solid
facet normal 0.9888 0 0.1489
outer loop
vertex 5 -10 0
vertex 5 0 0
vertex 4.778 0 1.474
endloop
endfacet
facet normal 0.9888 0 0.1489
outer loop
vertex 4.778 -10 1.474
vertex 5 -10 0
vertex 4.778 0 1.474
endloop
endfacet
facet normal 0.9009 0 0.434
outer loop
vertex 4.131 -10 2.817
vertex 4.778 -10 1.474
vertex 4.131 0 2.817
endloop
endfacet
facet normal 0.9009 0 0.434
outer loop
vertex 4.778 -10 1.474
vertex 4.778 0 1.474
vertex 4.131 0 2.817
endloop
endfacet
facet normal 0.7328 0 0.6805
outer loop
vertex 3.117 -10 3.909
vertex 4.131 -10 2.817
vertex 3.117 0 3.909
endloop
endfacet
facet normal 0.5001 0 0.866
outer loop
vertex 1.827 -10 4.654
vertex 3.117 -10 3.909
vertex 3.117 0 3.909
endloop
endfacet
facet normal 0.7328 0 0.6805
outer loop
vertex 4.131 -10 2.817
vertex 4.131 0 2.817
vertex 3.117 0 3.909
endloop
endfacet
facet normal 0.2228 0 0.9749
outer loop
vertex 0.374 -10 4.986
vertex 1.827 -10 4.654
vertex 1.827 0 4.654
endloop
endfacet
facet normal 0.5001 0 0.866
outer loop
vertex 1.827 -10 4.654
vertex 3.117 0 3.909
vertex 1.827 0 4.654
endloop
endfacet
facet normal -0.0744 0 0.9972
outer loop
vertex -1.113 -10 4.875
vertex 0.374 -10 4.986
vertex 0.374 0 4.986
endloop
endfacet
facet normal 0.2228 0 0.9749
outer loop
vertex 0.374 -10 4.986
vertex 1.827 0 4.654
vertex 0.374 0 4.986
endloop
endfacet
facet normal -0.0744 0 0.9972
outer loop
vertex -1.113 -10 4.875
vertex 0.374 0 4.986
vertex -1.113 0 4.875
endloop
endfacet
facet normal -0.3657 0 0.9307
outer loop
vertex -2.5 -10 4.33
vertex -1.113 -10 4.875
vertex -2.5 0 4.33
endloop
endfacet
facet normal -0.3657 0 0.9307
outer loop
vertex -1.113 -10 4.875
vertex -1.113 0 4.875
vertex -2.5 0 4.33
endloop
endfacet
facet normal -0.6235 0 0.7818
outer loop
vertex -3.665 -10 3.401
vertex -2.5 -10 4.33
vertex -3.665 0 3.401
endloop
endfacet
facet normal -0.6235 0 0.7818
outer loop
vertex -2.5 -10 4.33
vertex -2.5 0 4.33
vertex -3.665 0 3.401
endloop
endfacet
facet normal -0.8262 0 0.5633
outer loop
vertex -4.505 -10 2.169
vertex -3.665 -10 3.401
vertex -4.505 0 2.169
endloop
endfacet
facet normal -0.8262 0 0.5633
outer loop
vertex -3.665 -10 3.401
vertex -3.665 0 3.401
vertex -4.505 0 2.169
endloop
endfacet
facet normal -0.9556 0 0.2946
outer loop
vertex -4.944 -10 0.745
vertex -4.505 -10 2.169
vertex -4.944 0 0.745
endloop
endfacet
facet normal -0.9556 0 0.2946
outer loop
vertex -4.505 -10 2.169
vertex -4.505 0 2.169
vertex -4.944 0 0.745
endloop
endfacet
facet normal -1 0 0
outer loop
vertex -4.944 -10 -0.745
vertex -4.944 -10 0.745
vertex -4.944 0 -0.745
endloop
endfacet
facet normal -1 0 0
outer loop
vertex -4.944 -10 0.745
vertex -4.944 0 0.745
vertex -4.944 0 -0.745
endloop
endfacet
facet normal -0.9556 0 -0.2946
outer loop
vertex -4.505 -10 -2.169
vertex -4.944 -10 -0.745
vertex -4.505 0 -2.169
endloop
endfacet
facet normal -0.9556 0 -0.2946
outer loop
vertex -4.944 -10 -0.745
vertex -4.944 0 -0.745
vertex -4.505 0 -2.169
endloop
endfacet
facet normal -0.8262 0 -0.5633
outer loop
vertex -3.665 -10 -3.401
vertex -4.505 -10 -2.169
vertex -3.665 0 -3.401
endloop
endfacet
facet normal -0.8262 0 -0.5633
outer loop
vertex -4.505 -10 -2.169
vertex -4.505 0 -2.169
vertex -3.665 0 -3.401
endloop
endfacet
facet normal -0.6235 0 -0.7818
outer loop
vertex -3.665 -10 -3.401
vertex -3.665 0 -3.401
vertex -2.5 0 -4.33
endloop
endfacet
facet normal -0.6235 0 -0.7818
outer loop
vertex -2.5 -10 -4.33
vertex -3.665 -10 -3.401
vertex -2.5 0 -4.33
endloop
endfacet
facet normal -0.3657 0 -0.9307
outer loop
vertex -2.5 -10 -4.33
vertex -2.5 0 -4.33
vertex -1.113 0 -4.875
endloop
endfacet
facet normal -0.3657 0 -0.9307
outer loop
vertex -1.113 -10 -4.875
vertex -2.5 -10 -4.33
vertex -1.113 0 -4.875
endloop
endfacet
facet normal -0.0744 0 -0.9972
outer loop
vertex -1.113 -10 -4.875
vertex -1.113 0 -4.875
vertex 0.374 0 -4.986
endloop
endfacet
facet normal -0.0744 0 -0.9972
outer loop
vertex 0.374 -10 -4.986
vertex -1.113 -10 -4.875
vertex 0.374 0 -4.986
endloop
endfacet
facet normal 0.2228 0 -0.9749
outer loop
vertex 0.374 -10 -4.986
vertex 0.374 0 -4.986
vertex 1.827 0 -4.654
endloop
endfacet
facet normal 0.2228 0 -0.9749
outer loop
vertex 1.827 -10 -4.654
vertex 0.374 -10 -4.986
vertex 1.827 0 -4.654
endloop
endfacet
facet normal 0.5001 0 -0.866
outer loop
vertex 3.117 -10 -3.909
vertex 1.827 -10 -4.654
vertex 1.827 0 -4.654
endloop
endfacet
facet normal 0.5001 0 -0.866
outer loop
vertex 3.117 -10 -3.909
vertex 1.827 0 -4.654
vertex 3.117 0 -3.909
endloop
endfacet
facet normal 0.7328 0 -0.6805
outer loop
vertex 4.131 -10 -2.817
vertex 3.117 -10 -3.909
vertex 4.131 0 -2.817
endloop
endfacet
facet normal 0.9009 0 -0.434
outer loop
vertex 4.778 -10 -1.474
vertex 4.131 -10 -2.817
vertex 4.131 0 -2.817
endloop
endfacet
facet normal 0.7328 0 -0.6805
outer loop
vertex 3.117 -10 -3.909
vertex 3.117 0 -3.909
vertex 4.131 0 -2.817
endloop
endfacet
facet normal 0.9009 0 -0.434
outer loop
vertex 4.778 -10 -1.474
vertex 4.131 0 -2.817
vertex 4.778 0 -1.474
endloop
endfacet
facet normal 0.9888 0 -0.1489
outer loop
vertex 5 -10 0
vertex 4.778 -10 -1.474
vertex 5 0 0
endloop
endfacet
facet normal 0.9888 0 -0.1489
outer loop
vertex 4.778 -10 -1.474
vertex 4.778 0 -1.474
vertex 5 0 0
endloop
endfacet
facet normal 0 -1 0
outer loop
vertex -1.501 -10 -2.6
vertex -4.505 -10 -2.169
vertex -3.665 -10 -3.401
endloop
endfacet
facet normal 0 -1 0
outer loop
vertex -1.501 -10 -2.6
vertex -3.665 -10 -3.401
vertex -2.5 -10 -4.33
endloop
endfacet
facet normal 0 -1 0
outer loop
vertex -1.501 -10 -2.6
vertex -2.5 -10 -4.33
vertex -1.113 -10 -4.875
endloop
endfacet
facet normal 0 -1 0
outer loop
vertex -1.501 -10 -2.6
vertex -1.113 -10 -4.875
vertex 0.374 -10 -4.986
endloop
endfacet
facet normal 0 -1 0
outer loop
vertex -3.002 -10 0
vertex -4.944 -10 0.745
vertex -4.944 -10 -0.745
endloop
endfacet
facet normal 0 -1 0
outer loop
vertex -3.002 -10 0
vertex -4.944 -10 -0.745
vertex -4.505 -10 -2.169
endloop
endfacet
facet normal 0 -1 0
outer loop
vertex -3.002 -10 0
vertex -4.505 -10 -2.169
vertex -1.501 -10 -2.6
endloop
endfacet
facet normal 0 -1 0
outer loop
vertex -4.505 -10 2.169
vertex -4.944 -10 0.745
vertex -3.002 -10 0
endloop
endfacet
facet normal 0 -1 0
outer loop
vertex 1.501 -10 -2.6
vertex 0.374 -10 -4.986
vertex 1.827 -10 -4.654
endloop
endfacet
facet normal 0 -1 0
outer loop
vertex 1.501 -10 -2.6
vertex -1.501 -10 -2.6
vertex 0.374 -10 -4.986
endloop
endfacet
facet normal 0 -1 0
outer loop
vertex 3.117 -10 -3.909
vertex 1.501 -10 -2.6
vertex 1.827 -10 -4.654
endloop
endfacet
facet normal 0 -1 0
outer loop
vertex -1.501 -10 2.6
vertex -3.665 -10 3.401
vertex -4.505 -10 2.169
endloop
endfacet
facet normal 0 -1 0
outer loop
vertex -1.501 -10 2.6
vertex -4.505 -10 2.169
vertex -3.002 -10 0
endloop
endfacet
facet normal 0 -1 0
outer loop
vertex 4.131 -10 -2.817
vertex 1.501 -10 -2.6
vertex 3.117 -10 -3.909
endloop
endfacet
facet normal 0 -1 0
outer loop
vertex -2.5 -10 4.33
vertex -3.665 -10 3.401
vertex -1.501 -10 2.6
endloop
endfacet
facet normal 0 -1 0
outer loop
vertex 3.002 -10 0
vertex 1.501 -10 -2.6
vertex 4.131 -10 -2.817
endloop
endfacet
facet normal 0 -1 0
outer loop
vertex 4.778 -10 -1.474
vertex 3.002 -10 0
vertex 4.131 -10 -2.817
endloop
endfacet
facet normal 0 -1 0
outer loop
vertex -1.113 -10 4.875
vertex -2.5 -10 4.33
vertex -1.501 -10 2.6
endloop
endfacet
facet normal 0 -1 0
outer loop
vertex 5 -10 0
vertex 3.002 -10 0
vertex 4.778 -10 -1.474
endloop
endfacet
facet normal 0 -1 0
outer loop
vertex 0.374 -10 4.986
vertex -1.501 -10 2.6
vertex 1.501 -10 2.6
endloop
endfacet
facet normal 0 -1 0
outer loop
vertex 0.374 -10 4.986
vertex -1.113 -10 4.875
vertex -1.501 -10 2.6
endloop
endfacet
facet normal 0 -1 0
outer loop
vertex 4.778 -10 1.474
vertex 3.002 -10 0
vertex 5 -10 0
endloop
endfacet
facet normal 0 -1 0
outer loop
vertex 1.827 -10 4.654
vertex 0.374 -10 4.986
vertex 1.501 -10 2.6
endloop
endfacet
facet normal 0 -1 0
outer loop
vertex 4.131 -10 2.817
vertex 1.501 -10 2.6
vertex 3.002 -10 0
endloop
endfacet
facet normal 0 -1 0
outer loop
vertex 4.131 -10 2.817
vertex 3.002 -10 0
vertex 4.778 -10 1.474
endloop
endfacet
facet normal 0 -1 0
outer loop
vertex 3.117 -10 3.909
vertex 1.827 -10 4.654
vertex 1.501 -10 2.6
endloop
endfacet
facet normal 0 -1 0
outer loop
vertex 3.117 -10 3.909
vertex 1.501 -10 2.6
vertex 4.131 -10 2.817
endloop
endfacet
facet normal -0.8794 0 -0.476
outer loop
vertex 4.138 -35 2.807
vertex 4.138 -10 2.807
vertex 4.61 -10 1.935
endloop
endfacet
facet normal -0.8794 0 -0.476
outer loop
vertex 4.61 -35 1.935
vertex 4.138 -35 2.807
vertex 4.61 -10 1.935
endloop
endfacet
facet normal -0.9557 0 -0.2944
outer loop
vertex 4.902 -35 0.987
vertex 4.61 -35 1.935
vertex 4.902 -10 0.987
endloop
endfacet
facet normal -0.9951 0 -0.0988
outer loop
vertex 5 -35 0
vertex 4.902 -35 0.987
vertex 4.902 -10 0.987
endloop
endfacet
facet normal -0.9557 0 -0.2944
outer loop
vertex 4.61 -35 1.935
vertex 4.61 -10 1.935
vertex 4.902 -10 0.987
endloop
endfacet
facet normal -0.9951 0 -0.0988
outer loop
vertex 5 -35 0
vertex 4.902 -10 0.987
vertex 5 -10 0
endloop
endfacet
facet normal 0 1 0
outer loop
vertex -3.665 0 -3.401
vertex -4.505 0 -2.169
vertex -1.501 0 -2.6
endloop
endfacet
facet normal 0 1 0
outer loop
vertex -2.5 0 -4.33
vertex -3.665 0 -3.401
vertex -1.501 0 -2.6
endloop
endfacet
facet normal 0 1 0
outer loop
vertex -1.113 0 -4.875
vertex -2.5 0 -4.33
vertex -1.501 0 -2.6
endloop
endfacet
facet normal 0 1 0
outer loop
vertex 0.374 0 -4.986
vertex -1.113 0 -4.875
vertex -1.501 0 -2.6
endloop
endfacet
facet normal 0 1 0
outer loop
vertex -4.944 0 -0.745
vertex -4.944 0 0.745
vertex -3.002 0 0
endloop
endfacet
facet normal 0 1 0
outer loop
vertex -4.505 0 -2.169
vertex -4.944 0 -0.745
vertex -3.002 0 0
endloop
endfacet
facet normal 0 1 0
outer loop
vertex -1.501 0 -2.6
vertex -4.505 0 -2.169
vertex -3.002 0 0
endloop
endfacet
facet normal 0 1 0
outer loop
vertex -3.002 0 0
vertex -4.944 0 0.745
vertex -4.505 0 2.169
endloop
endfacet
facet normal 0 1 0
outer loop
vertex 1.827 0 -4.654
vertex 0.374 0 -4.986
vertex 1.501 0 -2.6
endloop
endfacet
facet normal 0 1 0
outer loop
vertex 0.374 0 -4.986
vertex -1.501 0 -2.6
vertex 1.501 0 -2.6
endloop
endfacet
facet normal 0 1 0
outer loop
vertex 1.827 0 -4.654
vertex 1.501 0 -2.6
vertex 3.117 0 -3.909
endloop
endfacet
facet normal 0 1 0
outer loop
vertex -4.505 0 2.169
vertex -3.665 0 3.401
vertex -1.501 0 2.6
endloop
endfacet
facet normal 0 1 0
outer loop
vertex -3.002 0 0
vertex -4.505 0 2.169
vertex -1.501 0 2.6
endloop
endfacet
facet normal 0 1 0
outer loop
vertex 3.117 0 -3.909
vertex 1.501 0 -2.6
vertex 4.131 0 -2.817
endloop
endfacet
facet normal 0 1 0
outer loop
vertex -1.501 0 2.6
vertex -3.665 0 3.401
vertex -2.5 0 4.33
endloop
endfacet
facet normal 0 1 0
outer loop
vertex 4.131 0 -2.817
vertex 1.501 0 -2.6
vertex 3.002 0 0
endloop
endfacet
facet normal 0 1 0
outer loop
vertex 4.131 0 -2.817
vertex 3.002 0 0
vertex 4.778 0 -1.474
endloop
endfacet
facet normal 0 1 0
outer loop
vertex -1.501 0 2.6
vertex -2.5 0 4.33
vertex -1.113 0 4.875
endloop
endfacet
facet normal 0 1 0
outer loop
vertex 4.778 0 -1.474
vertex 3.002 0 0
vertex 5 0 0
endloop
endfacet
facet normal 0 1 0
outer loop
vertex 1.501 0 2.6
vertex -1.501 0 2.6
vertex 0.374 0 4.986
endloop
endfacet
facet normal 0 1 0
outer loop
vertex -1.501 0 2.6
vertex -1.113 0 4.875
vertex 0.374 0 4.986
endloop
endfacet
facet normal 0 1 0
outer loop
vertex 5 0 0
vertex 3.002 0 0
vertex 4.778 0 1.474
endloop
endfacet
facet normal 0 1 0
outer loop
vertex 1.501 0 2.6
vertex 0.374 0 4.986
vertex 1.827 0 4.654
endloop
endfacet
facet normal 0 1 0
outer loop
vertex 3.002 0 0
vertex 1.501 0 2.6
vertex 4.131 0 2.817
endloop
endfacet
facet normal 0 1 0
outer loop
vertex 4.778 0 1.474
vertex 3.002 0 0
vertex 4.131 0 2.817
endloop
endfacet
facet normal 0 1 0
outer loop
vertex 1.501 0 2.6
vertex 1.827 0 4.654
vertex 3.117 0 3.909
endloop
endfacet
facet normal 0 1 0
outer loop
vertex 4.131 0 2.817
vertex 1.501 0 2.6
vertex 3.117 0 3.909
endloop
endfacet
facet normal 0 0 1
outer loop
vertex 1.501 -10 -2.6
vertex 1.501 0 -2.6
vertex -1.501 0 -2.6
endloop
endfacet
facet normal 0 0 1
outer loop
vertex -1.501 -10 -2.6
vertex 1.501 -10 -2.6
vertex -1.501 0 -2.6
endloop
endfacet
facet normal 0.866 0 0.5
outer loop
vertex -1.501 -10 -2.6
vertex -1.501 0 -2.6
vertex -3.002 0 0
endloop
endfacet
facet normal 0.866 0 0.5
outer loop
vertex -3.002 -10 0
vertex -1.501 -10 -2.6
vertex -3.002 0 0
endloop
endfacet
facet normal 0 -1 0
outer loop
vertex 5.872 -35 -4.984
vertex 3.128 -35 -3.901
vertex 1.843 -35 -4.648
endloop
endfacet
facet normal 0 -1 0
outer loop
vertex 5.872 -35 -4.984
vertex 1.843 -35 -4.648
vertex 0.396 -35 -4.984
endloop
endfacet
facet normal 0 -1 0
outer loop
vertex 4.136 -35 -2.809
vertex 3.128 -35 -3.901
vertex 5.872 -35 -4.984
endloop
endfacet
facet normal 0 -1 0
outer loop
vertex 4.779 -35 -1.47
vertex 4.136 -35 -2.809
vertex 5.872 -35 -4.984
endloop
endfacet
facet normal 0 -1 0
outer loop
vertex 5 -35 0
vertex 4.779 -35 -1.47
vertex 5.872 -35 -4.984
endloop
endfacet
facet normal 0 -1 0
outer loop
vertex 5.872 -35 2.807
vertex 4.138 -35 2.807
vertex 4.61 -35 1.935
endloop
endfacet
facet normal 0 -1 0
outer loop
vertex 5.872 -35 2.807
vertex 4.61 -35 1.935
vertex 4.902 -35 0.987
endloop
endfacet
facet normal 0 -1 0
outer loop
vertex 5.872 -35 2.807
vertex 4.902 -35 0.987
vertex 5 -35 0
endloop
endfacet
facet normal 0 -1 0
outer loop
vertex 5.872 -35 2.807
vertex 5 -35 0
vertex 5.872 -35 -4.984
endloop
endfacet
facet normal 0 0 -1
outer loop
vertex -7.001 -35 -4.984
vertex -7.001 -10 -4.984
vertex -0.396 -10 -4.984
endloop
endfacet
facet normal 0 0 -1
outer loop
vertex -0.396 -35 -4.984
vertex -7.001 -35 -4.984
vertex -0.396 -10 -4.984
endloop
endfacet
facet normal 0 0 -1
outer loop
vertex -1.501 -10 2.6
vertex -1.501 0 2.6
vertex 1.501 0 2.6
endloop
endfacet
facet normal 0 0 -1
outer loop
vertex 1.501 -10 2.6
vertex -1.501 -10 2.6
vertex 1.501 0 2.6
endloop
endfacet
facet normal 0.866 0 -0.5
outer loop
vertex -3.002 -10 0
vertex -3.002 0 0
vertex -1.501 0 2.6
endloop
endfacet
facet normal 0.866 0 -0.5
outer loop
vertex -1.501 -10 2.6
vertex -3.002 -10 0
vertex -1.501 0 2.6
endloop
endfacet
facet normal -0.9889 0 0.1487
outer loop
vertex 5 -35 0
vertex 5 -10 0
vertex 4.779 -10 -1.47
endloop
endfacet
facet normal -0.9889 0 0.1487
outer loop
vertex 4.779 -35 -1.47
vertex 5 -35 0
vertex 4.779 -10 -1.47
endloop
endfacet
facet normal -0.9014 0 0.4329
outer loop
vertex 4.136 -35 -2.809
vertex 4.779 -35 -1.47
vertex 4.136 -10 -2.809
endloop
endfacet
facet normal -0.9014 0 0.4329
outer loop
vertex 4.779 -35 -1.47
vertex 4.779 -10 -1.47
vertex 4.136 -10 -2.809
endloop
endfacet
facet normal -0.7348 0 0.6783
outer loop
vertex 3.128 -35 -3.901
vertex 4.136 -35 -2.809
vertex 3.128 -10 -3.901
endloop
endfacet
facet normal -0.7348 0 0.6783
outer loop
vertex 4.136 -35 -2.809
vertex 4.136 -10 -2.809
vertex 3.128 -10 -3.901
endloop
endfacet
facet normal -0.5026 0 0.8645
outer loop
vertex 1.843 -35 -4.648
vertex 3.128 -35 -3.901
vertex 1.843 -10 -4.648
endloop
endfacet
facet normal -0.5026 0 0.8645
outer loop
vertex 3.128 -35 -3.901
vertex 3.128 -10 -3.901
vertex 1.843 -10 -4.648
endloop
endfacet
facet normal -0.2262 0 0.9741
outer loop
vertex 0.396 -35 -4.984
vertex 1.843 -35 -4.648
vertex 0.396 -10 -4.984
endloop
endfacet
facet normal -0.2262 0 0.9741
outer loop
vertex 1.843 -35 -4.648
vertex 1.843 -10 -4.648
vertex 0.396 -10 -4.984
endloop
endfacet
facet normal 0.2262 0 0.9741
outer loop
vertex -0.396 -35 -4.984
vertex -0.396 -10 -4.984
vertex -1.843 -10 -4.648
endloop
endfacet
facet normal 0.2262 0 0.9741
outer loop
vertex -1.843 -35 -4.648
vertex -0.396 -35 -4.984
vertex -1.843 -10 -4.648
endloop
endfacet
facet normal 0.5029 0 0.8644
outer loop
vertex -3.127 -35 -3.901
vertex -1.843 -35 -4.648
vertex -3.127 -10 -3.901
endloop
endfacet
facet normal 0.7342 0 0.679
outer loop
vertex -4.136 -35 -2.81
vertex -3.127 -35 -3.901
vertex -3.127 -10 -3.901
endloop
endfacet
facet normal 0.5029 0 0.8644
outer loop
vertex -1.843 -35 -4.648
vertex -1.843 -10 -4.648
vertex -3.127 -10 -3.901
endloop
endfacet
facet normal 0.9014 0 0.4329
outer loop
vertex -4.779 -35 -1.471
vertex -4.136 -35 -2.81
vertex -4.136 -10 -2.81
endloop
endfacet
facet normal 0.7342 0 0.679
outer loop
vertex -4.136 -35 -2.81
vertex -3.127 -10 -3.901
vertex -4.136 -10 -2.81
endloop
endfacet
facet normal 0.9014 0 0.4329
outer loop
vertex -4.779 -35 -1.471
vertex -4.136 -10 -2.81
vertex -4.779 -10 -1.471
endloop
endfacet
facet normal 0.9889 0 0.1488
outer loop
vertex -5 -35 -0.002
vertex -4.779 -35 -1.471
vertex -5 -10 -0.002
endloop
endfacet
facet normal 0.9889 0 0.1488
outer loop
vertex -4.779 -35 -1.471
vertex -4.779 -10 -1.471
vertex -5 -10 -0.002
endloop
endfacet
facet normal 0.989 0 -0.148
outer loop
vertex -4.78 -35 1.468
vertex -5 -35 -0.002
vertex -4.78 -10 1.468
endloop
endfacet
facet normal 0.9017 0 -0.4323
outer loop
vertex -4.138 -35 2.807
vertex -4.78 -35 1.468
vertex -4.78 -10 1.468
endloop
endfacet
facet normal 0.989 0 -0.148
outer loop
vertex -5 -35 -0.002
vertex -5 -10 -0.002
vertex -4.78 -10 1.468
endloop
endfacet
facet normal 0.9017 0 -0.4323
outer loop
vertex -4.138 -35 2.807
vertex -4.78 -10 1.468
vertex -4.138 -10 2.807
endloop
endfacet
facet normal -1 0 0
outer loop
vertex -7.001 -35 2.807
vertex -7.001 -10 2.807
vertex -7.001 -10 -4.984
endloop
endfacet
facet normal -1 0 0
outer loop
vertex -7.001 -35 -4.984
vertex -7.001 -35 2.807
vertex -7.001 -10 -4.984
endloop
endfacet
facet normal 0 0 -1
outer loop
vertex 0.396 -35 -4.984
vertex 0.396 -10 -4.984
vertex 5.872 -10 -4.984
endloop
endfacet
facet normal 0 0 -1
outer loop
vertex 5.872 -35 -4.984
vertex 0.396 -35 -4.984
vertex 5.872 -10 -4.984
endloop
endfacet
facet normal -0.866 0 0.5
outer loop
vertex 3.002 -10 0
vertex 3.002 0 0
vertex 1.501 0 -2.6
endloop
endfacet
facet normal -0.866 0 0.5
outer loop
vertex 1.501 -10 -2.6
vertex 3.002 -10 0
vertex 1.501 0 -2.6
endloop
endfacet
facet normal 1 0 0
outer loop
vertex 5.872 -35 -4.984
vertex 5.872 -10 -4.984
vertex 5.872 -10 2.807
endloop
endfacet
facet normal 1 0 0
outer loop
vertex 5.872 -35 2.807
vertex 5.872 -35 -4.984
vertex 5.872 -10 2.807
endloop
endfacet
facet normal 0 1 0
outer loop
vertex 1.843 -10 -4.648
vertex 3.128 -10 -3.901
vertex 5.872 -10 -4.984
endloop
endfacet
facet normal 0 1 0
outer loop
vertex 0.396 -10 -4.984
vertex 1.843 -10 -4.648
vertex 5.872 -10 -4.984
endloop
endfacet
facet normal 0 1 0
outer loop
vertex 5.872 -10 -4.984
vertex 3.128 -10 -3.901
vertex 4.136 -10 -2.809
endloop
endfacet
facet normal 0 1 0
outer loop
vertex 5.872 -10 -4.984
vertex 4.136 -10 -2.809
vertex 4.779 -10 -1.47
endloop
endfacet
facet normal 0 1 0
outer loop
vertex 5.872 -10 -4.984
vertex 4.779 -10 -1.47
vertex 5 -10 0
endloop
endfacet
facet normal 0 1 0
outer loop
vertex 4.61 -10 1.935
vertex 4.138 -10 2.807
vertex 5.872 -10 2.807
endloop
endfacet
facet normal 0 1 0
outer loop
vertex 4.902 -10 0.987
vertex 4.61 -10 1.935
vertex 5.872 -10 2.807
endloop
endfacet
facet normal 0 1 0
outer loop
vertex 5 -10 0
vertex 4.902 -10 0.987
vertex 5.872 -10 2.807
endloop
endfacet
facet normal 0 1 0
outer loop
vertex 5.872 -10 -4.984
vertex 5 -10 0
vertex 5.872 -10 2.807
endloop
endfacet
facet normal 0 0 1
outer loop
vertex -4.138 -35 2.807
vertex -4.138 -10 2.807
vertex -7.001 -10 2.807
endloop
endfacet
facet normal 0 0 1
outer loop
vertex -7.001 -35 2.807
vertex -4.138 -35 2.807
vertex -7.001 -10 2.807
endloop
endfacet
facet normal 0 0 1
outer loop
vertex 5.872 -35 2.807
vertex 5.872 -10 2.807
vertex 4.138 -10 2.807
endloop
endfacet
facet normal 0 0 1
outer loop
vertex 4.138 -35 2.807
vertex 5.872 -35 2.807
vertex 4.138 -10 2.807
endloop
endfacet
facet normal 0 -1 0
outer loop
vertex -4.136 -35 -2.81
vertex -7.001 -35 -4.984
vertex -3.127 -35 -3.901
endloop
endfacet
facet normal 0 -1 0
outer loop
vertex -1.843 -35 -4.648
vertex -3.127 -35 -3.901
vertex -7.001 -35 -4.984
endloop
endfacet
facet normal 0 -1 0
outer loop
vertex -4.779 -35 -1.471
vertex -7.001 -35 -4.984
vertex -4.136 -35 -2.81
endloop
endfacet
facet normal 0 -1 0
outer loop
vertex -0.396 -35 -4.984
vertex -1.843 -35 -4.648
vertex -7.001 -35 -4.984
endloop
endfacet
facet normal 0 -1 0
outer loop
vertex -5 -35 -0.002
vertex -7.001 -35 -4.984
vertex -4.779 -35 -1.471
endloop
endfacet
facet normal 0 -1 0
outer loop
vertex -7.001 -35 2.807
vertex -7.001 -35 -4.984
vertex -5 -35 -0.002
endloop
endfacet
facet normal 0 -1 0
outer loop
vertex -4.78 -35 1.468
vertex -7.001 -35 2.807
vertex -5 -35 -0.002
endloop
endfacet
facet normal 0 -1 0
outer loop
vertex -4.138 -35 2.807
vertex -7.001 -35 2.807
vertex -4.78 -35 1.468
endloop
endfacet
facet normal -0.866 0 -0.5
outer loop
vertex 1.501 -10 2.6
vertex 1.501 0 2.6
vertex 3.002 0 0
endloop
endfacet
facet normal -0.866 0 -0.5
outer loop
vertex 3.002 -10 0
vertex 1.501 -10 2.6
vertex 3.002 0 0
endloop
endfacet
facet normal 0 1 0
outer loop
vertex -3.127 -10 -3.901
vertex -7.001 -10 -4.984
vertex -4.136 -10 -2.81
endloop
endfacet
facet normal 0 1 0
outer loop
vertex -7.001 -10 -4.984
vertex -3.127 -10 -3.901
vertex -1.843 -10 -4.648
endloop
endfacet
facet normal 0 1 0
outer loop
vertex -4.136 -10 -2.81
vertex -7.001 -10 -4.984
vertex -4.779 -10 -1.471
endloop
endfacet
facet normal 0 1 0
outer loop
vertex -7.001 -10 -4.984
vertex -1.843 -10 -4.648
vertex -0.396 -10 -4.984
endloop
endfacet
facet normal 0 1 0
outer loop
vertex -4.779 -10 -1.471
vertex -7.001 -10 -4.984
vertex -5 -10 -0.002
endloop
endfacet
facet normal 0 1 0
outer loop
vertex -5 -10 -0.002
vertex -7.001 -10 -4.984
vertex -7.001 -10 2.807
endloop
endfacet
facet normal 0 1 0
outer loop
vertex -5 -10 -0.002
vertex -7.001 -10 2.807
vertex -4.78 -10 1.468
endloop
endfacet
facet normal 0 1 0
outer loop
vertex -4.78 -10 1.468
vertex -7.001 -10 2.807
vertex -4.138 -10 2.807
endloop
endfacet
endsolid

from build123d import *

# Parameters (mm, degrees)
F0_R     = 5
F1_DEPTH = 10
F3_DEPTH = 25


with BuildPart() as f1:
    # F0 (on Front) → F1 (new body)
    with BuildSketch(Plane.XZ):
        Circle(F0_R)
        Polygon((-3.002221, 0), (-1.501111, 2.6), (1.501111, 2.6), (3.002221, 0), (1.501111, -2.6), (-1.501111, -2.6), align=None, mode=Mode.SUBTRACT)
    extrude(amount=F1_DEPTH)


with BuildPart() as f3:
    # F2 (on face) → F3 (new body)
    with BuildSketch(Plane.XZ.offset(10)):
        with BuildLine():
            Line((-4.137537, 2.807274), (-7.000998, 2.807274))
            Line((-7.000998, 2.807274), (-7.000998, -4.984333))
            Line((-7.000998, -4.984333), (-0.395509, -4.984333))
            ThreePointArc((-0.395509, -4.984333), (-4.507151, -2.164622), (-4.137537, 2.807274))
        make_face()
        with BuildLine():
            Line((5.872068, 2.807274), (4.137537, 2.807274))
            ThreePointArc((4.137537, 2.807274), (4.779523, 1.468386), (5, 0))
            ThreePointArc((5, 0), (3.672706, -3.39282), (0.395509, -4.984333))
            Line((0.395509, -4.984333), (5.872068, -4.984333))
            Line((5.872068, -4.984333), (5.872068, 2.807274))
        make_face()
    extrude(amount=F3_DEPTH)


solid = Compound([f1.part, f3.part])
